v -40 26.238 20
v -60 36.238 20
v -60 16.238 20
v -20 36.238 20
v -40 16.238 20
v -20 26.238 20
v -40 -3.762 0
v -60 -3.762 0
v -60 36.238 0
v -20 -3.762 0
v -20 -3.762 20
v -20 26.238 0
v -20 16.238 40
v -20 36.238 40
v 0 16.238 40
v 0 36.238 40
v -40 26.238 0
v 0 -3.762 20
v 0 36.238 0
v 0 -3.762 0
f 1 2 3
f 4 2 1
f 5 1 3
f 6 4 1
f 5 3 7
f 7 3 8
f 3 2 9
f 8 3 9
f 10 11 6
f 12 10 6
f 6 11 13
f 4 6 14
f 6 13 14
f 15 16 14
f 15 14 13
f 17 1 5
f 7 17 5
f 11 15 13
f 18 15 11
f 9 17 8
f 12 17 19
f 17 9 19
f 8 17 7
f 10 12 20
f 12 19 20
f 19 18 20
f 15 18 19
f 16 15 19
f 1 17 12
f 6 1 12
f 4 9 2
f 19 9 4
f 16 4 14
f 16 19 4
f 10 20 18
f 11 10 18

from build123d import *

# Parameters (mm, degrees)
F1_DEPTH = 20
F2_W     = 40
F2_H     = 20
F3_DEPTH = 40
F5_DEPTH = 40
F6_W     = 20
F6_H     = 30
F7_DEPTH = 25


with BuildPart() as f1:
    # F0 (on Right) → F1 (new body)
    with BuildSketch(Plane.YZ):
        Polygon((-3.7623762107, 0), (36.2376237893, 0), (36.2376237893, 40), (16.2376237893, 40), (-3.7623762107, 20), align=None)
    extrude(amount=-F1_DEPTH)

    # F2 (on face) → F3 (join)
    with BuildSketch(Plane(origin=(-20, 0, 0), x_dir=(0, -1, 0), z_dir=(-1, 0, 0))):
        with Locations((-16.2376237893, 10)):
            Rectangle(F2_W, F2_H)
    extrude(amount=F3_DEPTH)

    # F4 (on face) → F5 (cut)
    with BuildSketch(Plane(origin=(-60, 0, 0), x_dir=(0, -1, 0), z_dir=(-1, 0, 0))):
        Polygon((3.7623762107, 20), (-16.2376237893, 20), (3.7623762107, 0), align=None)
    extrude(amount=-F5_DEPTH, mode=Mode.SUBTRACT)

    # F6 (on face) → F7 (cut)
    with BuildSketch(Plane(origin=(0, 0, 0), x_dir=(1, 0, 0), z_dir=(0, 0, -1))):
        with Locations((-30, -11.2376237893)):
            Rectangle(F6_W, F6_H)
    extrude(amount=-F7_DEPTH, mode=Mode.SUBTRACT)


solid = f1.part
